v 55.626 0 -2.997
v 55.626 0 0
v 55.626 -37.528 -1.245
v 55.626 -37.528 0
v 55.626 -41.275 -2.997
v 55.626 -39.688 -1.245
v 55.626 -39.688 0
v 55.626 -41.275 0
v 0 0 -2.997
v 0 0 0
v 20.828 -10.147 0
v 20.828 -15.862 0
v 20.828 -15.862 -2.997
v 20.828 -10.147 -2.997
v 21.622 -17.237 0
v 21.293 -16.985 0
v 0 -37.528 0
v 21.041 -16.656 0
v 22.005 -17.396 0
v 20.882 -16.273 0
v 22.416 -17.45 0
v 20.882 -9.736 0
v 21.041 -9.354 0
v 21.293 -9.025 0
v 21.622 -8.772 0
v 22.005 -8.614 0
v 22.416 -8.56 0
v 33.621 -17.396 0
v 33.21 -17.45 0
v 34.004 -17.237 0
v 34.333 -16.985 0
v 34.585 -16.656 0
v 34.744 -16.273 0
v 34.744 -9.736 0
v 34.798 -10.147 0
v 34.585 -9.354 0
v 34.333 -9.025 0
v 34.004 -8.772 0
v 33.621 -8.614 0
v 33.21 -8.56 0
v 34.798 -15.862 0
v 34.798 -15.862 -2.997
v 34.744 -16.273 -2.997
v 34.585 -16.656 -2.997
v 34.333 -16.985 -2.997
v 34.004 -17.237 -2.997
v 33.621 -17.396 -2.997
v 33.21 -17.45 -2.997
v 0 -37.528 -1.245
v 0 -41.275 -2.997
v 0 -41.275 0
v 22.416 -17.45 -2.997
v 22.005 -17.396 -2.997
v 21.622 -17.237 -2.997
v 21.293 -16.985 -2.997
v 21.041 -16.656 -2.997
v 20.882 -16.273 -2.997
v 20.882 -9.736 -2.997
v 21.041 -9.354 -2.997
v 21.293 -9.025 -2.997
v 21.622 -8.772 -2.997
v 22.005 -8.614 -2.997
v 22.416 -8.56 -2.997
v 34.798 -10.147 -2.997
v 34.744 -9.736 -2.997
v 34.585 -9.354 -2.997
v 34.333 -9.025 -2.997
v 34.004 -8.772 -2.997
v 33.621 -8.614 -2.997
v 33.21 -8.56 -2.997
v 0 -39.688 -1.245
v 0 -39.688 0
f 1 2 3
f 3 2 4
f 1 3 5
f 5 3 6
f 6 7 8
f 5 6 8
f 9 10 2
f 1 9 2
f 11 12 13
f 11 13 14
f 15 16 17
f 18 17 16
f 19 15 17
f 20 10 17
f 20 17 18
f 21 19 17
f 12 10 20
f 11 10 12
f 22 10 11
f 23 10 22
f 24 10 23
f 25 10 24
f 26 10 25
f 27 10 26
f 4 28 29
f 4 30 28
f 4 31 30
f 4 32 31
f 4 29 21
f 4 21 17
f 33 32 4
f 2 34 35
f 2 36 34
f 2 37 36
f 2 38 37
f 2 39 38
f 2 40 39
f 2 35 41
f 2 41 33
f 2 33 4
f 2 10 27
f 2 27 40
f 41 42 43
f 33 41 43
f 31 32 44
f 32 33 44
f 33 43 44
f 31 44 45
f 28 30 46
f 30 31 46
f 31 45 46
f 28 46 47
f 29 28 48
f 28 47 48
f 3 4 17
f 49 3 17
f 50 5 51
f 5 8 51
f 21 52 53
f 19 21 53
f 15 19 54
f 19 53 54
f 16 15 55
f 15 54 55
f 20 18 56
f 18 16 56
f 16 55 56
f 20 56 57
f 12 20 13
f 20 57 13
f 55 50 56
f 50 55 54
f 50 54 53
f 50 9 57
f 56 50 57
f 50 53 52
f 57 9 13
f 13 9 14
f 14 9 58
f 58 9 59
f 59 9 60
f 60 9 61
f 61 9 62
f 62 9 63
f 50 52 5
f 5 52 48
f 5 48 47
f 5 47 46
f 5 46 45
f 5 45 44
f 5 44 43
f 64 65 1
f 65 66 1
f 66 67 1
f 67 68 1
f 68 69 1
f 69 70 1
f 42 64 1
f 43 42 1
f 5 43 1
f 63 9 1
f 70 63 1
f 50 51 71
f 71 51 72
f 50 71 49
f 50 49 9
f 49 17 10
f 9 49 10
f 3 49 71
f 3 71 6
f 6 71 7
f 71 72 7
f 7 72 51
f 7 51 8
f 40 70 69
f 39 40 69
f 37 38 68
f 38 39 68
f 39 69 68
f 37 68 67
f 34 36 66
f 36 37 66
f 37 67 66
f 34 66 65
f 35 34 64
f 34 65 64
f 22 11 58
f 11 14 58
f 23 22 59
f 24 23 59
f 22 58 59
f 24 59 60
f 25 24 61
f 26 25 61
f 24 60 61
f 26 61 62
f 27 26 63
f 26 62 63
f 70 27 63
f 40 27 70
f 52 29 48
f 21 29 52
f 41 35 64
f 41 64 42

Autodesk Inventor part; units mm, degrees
ref_plane "YZ Plane" through (0, 0, 0) normal (1, 0, 0) x (0, 1, 0)
ref_plane "XZ Plane" through (0, 0, 0) normal (0, 1, 0) x (-1, 0, 0)
ref_plane "XY Plane" through (0, 0, 0) normal (0, 0, 1) x (1, 0, 0)
sketch "Sketch1" plane through (0, 0, 0) normal (0, 0, 1) x (1, 0, 0)
  line L0 (0, 0) -> (55.626, 0)
  line L1 (55.626, 0) -> (55.626, -41.275)
  line L2 (55.626, -41.275) -> (0, -41.275)
  line L3 (0, -41.275) -> (0, 0)
  dimension "d0" = 41.275
  dimension "d1" = 55.626
extrude "Extrusion1" add sketch "Sketch1" against normal blind 2.9972
sketch "Sketch2" plane through (0, 0, 0) normal (0, 0, 1) x (1, 0, 0)
  line L0 (0, -41.275) -> (0, 0) projected
  line L1 (55.626, -41.275) -> (0, -41.275) projected
  line L2 (20.828, -8.5598) -> (34.798, -8.5598)
  line L3 (34.798, -8.5598) -> (34.798, -17.4498)
  line L4 (34.798, -17.4498) -> (20.828, -17.4498)
  line L5 (20.828, -17.4498) -> (20.828, -8.5598)
  dimension "d4" = 13.97
  dimension "d5" = 8.89
  dimension "d6" = 20.828
  dimension "d7" = 23.8252
extrude "Extrusion2" cut sketch "Sketch2" against normal blind 2.9972
fillet "Fillet1" radius 1.5875 4 edges at (20.828, -17.4498, -1.4986) (20.828, -8.5598, -1.4986) (34.798, -8.5598, -1.4986) (34.798, -17.4498, -1.4986)
sketch "Sketch3" plane through (0, 0, 0) normal (0, 0, 1) x (1, 0, 0)
  line L0 (0, -41.275) -> (0, 0) projected
  line L1 (55.626, -41.275) -> (0, -41.275) projected
  line L2 (55.626, 0) -> (55.626, -41.275) projected
  line L3 (0, -39.6875) -> (55.626, -39.6875)
  line L4 (55.626, -39.6875) -> (55.626, -37.5285)
  line L5 (55.626, -37.5285) -> (0, -37.5285)
  line L6 (0, -37.5285) -> (0, -39.6875)
  dimension "d11" = 1.5875
  dimension "d12" = 2.159
extrude "Extrusion3" cut sketch "Sketch3" against normal blind 1.2446 contours L0 L5 L2 L3
properties part number "Lidar Sensor Case 4 v2 CNC"
